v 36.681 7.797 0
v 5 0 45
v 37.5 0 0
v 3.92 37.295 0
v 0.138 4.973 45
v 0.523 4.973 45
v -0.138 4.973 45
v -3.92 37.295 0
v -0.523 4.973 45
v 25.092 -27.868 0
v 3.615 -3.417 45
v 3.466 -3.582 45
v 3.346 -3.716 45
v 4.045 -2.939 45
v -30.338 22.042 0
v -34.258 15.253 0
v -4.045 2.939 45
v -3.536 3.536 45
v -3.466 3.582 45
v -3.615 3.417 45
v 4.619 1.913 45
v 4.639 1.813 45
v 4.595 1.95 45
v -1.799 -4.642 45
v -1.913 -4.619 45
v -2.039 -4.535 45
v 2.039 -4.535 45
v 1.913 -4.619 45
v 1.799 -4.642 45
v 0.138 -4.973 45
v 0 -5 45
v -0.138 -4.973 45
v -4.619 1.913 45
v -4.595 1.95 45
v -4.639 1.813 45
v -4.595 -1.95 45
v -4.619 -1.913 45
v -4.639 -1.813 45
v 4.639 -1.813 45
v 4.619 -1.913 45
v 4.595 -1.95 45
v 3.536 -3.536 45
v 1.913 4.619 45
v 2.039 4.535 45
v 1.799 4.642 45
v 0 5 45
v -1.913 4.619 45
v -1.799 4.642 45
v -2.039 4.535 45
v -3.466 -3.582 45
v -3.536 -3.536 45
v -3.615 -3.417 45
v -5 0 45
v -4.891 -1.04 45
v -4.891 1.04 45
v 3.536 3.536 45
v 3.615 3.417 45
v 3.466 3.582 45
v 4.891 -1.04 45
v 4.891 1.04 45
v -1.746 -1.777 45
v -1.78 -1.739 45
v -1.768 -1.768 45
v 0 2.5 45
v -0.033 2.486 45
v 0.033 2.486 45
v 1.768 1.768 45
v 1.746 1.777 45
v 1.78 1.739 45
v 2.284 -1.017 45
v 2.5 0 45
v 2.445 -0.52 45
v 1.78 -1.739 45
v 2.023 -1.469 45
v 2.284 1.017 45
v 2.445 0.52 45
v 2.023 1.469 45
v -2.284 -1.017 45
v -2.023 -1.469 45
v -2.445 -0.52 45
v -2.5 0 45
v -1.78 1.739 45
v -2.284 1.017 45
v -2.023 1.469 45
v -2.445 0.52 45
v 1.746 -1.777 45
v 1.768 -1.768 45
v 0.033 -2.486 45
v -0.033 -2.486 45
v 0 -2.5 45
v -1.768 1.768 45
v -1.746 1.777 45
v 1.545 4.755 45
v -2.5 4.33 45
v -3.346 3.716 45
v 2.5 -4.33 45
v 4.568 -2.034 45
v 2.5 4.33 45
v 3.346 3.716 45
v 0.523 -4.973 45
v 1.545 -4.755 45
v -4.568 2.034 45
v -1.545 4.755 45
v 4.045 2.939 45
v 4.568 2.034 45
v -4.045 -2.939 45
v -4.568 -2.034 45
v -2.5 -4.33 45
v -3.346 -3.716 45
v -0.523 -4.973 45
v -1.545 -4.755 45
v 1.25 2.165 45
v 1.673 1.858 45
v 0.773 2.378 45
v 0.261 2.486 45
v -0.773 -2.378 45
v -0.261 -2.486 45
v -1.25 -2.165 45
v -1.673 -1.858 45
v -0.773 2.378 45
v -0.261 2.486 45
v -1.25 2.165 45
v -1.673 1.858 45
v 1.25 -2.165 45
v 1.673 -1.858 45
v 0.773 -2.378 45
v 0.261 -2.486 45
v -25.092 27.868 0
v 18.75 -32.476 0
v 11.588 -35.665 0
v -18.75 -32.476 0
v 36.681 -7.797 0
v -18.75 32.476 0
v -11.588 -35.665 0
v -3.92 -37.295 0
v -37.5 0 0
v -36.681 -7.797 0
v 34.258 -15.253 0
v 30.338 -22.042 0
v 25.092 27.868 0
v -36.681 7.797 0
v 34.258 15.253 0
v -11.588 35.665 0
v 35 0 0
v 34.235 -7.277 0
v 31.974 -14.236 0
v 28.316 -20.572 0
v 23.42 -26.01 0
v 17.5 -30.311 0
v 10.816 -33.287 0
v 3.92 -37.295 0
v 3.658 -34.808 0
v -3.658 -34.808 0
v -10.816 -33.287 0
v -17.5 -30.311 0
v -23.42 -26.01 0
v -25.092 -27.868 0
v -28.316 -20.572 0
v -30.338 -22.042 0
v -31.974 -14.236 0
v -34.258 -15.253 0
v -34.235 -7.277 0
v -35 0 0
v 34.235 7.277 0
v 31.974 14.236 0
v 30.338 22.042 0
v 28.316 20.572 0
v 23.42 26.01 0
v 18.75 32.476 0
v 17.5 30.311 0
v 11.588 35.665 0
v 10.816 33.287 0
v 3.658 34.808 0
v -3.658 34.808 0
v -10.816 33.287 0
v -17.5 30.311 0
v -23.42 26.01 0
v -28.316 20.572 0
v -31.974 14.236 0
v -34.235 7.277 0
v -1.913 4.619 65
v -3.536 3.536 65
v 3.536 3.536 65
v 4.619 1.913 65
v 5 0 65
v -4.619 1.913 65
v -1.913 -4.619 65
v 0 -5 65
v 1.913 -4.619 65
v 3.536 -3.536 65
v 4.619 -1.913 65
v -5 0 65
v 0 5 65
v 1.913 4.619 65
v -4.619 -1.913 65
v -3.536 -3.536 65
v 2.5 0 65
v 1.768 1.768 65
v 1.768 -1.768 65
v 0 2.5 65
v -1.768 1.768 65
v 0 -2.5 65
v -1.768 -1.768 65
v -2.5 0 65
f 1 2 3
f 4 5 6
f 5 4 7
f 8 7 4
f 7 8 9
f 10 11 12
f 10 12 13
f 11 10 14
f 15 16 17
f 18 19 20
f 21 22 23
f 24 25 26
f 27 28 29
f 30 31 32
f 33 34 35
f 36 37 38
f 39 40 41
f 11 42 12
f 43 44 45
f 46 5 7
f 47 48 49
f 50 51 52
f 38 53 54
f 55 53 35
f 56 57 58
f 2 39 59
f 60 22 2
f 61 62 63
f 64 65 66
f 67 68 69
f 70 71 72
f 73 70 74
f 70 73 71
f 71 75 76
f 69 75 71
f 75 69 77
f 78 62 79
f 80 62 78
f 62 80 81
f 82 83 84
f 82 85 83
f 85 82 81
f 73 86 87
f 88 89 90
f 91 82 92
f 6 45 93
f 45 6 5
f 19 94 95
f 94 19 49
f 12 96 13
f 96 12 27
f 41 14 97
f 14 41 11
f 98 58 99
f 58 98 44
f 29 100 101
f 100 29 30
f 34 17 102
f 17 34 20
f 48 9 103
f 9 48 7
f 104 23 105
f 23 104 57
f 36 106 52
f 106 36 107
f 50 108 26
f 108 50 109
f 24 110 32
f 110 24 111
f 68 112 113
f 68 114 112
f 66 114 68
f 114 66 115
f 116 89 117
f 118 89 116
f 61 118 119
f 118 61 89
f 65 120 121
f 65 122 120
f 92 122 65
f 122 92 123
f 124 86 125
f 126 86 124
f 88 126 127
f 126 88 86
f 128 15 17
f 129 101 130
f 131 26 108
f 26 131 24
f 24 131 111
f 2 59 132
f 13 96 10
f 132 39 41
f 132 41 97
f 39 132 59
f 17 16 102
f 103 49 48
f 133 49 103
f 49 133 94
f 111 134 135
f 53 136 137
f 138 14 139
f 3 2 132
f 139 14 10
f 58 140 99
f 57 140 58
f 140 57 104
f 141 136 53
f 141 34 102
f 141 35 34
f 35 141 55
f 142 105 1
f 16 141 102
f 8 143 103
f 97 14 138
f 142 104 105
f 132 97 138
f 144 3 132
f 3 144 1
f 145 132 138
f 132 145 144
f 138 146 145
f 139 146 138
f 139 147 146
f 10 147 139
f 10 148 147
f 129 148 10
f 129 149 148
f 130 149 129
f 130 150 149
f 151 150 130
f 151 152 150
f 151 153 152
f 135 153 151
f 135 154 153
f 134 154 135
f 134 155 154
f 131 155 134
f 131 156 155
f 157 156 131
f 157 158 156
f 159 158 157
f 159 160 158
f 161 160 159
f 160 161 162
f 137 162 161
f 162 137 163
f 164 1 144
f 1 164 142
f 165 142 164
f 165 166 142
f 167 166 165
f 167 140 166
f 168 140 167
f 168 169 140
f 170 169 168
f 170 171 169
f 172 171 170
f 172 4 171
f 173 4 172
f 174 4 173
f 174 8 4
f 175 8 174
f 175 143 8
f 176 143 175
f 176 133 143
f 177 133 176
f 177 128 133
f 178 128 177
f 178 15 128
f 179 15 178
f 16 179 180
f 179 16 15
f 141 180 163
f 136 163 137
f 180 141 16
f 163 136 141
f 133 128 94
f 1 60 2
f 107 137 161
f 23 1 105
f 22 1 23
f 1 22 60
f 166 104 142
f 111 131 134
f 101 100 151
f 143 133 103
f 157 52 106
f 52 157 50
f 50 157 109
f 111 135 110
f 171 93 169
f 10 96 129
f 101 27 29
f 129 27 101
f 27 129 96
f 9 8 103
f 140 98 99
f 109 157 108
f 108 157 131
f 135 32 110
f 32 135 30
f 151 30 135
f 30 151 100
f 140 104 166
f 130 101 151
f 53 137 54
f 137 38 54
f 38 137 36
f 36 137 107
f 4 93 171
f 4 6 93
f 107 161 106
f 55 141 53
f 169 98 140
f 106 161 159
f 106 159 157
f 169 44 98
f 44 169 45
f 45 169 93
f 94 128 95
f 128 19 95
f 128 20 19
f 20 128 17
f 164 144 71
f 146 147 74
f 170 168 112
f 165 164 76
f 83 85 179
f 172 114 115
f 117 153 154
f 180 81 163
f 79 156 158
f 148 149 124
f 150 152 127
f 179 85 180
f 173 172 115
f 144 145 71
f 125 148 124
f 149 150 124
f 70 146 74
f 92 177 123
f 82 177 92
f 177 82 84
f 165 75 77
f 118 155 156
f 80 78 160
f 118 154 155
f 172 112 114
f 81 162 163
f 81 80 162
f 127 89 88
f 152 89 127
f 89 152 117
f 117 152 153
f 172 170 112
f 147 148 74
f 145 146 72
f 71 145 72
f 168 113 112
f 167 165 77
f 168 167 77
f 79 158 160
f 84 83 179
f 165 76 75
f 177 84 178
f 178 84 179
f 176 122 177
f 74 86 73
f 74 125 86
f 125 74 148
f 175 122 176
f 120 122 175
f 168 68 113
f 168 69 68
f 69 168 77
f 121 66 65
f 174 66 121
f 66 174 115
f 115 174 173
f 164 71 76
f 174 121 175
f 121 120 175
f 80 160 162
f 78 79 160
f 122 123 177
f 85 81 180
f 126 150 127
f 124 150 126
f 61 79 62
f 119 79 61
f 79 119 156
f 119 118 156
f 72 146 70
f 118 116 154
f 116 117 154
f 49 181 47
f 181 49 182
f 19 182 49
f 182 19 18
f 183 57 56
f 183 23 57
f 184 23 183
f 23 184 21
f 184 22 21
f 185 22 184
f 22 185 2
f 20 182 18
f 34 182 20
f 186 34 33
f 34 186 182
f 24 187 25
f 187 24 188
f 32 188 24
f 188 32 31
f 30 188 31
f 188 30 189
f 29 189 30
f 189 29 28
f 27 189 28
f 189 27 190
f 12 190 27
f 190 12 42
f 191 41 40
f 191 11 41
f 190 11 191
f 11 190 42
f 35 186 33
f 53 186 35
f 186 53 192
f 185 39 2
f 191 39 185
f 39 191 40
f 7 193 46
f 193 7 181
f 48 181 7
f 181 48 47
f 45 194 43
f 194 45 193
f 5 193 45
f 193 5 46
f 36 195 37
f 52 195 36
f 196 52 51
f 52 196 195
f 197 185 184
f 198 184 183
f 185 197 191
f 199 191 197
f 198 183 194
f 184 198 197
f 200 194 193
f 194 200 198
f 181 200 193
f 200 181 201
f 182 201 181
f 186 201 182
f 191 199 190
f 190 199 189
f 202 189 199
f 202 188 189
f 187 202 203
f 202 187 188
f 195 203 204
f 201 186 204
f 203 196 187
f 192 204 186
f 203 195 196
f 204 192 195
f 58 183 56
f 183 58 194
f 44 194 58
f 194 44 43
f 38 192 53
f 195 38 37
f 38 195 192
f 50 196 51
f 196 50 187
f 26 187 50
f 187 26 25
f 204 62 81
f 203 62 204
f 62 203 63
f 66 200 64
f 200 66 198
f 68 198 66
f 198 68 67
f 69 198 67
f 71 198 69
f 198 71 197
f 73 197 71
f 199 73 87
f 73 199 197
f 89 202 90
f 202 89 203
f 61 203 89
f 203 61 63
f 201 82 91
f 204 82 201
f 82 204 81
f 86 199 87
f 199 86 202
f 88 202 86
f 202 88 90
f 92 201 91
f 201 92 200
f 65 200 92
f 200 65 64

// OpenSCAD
// Parametric Funnel by Coasterman

// VARIABLES
bottom_diameter = 70;
cone_height = 45;
top_diameter = 5;
top_height = 20;
width = 2.5;

// CODE
union()
{
difference()
{
cylinder(h=cone_height, r1=bottom_diameter/2 + width, r2 = top_diameter/2 + width);
cylinder(h=cone_height, r1=bottom_diameter/2, r2 = top_diameter/2);
}
translate([0, 0, cone_height])
{
difference()
{
cylinder(h=top_height, r=top_diameter/2 + width);
cylinder(h=top_height, r=top_diameter/2);
}
}
}
